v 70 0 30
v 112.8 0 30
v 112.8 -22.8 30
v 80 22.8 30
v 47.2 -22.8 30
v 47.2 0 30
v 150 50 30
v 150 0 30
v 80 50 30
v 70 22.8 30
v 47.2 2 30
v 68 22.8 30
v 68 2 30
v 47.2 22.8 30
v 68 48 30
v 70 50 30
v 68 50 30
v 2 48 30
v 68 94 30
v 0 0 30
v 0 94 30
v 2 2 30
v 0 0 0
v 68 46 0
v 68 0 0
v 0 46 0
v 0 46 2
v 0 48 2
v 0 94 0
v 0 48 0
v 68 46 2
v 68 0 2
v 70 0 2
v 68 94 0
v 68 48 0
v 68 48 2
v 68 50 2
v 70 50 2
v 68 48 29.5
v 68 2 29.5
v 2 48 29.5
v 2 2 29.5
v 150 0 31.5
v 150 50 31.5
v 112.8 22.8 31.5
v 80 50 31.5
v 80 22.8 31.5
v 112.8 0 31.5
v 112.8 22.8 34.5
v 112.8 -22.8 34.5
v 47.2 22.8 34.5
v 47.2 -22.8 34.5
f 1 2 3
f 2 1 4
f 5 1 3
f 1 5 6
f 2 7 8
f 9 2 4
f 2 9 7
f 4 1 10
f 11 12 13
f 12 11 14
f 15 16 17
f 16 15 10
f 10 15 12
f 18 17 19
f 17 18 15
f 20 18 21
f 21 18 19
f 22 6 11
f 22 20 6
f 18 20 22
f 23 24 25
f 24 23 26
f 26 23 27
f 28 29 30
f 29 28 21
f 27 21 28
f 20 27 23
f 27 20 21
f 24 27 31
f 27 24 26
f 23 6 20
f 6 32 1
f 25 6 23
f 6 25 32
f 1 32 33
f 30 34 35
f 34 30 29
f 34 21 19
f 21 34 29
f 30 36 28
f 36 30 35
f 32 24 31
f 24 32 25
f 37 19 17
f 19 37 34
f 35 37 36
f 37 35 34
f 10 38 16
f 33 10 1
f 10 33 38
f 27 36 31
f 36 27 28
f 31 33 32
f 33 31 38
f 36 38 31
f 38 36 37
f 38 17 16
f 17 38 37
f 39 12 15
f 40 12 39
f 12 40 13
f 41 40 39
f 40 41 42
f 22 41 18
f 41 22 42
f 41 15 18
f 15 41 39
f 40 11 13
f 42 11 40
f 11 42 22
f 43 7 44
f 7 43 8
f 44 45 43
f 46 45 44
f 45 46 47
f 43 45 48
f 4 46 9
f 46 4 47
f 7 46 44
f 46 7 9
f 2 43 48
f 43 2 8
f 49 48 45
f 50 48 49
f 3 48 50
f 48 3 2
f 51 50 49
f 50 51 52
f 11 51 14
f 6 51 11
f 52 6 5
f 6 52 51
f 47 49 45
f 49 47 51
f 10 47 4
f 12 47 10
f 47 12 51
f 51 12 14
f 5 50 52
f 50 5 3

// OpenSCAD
// Two-part enclosure for small electronics board (e.g. Arduino-based logger)
// Print orientation: box standing on the bed, lid flat on top

// ---------------- Parameters ----------------
box_x      = 70;    // box outer length (X)
box_y      = 50;    // box outer width (Y)
box_z      = 30;    // box outer height (Z)
box_wall   = 2;     // box wall thickness
box_floor  = 2;     // box floor thickness

gap        = 10;    // gap between box and lid (X direction)

lip_x      = 65.6;  // lid lip outer length (X)
lip_y      = 45.6;  // lid lip outer width (Y)
lip_w      = 1.5;   // lid lip thickness (Z)
lip_h      = 4;     // lid lip height

eps        = 0.5;   // overlap / cutter extension

$fn = 64;

// ---------------- Modules ----------------
module box() {
    difference() {
        union() {
            // walls
            for (dx = [-1, 1], dy = [-1, 1])
                translate([dx > 0 ? box_wall : 0, dy > 0 ? box_y - box_wall : 0, 0])
                    cube([box_x - 2 * box_wall, box_y - 2 * box_wall, box_z]);
            // floor
            translate([0, 0, box_floor])
                cube([box_x, box_y, box_z - box_floor]);
        }
        // open-top cutter
        translate([box_wall, box_wall, box_z - eps])
            cube([box_x - 2 * box_wall, box_y - 2 * box_wall, box_z + 2 * eps]);
    }
}

module lid() {
    union() {
        // plate
        translate([0, 0, box_z])
            cube([box_x, box_y, lip_w]);
        // lip
        translate([-lip_x / 2, -lip_y / 2, box_z])
            cube([lip_x, lip_y, lip_h + eps]);
    }
}

// ---------------- Assembly ----------------
union() {
    box();
    translate([box_x + gap, 0, 0])
        lid();
}
